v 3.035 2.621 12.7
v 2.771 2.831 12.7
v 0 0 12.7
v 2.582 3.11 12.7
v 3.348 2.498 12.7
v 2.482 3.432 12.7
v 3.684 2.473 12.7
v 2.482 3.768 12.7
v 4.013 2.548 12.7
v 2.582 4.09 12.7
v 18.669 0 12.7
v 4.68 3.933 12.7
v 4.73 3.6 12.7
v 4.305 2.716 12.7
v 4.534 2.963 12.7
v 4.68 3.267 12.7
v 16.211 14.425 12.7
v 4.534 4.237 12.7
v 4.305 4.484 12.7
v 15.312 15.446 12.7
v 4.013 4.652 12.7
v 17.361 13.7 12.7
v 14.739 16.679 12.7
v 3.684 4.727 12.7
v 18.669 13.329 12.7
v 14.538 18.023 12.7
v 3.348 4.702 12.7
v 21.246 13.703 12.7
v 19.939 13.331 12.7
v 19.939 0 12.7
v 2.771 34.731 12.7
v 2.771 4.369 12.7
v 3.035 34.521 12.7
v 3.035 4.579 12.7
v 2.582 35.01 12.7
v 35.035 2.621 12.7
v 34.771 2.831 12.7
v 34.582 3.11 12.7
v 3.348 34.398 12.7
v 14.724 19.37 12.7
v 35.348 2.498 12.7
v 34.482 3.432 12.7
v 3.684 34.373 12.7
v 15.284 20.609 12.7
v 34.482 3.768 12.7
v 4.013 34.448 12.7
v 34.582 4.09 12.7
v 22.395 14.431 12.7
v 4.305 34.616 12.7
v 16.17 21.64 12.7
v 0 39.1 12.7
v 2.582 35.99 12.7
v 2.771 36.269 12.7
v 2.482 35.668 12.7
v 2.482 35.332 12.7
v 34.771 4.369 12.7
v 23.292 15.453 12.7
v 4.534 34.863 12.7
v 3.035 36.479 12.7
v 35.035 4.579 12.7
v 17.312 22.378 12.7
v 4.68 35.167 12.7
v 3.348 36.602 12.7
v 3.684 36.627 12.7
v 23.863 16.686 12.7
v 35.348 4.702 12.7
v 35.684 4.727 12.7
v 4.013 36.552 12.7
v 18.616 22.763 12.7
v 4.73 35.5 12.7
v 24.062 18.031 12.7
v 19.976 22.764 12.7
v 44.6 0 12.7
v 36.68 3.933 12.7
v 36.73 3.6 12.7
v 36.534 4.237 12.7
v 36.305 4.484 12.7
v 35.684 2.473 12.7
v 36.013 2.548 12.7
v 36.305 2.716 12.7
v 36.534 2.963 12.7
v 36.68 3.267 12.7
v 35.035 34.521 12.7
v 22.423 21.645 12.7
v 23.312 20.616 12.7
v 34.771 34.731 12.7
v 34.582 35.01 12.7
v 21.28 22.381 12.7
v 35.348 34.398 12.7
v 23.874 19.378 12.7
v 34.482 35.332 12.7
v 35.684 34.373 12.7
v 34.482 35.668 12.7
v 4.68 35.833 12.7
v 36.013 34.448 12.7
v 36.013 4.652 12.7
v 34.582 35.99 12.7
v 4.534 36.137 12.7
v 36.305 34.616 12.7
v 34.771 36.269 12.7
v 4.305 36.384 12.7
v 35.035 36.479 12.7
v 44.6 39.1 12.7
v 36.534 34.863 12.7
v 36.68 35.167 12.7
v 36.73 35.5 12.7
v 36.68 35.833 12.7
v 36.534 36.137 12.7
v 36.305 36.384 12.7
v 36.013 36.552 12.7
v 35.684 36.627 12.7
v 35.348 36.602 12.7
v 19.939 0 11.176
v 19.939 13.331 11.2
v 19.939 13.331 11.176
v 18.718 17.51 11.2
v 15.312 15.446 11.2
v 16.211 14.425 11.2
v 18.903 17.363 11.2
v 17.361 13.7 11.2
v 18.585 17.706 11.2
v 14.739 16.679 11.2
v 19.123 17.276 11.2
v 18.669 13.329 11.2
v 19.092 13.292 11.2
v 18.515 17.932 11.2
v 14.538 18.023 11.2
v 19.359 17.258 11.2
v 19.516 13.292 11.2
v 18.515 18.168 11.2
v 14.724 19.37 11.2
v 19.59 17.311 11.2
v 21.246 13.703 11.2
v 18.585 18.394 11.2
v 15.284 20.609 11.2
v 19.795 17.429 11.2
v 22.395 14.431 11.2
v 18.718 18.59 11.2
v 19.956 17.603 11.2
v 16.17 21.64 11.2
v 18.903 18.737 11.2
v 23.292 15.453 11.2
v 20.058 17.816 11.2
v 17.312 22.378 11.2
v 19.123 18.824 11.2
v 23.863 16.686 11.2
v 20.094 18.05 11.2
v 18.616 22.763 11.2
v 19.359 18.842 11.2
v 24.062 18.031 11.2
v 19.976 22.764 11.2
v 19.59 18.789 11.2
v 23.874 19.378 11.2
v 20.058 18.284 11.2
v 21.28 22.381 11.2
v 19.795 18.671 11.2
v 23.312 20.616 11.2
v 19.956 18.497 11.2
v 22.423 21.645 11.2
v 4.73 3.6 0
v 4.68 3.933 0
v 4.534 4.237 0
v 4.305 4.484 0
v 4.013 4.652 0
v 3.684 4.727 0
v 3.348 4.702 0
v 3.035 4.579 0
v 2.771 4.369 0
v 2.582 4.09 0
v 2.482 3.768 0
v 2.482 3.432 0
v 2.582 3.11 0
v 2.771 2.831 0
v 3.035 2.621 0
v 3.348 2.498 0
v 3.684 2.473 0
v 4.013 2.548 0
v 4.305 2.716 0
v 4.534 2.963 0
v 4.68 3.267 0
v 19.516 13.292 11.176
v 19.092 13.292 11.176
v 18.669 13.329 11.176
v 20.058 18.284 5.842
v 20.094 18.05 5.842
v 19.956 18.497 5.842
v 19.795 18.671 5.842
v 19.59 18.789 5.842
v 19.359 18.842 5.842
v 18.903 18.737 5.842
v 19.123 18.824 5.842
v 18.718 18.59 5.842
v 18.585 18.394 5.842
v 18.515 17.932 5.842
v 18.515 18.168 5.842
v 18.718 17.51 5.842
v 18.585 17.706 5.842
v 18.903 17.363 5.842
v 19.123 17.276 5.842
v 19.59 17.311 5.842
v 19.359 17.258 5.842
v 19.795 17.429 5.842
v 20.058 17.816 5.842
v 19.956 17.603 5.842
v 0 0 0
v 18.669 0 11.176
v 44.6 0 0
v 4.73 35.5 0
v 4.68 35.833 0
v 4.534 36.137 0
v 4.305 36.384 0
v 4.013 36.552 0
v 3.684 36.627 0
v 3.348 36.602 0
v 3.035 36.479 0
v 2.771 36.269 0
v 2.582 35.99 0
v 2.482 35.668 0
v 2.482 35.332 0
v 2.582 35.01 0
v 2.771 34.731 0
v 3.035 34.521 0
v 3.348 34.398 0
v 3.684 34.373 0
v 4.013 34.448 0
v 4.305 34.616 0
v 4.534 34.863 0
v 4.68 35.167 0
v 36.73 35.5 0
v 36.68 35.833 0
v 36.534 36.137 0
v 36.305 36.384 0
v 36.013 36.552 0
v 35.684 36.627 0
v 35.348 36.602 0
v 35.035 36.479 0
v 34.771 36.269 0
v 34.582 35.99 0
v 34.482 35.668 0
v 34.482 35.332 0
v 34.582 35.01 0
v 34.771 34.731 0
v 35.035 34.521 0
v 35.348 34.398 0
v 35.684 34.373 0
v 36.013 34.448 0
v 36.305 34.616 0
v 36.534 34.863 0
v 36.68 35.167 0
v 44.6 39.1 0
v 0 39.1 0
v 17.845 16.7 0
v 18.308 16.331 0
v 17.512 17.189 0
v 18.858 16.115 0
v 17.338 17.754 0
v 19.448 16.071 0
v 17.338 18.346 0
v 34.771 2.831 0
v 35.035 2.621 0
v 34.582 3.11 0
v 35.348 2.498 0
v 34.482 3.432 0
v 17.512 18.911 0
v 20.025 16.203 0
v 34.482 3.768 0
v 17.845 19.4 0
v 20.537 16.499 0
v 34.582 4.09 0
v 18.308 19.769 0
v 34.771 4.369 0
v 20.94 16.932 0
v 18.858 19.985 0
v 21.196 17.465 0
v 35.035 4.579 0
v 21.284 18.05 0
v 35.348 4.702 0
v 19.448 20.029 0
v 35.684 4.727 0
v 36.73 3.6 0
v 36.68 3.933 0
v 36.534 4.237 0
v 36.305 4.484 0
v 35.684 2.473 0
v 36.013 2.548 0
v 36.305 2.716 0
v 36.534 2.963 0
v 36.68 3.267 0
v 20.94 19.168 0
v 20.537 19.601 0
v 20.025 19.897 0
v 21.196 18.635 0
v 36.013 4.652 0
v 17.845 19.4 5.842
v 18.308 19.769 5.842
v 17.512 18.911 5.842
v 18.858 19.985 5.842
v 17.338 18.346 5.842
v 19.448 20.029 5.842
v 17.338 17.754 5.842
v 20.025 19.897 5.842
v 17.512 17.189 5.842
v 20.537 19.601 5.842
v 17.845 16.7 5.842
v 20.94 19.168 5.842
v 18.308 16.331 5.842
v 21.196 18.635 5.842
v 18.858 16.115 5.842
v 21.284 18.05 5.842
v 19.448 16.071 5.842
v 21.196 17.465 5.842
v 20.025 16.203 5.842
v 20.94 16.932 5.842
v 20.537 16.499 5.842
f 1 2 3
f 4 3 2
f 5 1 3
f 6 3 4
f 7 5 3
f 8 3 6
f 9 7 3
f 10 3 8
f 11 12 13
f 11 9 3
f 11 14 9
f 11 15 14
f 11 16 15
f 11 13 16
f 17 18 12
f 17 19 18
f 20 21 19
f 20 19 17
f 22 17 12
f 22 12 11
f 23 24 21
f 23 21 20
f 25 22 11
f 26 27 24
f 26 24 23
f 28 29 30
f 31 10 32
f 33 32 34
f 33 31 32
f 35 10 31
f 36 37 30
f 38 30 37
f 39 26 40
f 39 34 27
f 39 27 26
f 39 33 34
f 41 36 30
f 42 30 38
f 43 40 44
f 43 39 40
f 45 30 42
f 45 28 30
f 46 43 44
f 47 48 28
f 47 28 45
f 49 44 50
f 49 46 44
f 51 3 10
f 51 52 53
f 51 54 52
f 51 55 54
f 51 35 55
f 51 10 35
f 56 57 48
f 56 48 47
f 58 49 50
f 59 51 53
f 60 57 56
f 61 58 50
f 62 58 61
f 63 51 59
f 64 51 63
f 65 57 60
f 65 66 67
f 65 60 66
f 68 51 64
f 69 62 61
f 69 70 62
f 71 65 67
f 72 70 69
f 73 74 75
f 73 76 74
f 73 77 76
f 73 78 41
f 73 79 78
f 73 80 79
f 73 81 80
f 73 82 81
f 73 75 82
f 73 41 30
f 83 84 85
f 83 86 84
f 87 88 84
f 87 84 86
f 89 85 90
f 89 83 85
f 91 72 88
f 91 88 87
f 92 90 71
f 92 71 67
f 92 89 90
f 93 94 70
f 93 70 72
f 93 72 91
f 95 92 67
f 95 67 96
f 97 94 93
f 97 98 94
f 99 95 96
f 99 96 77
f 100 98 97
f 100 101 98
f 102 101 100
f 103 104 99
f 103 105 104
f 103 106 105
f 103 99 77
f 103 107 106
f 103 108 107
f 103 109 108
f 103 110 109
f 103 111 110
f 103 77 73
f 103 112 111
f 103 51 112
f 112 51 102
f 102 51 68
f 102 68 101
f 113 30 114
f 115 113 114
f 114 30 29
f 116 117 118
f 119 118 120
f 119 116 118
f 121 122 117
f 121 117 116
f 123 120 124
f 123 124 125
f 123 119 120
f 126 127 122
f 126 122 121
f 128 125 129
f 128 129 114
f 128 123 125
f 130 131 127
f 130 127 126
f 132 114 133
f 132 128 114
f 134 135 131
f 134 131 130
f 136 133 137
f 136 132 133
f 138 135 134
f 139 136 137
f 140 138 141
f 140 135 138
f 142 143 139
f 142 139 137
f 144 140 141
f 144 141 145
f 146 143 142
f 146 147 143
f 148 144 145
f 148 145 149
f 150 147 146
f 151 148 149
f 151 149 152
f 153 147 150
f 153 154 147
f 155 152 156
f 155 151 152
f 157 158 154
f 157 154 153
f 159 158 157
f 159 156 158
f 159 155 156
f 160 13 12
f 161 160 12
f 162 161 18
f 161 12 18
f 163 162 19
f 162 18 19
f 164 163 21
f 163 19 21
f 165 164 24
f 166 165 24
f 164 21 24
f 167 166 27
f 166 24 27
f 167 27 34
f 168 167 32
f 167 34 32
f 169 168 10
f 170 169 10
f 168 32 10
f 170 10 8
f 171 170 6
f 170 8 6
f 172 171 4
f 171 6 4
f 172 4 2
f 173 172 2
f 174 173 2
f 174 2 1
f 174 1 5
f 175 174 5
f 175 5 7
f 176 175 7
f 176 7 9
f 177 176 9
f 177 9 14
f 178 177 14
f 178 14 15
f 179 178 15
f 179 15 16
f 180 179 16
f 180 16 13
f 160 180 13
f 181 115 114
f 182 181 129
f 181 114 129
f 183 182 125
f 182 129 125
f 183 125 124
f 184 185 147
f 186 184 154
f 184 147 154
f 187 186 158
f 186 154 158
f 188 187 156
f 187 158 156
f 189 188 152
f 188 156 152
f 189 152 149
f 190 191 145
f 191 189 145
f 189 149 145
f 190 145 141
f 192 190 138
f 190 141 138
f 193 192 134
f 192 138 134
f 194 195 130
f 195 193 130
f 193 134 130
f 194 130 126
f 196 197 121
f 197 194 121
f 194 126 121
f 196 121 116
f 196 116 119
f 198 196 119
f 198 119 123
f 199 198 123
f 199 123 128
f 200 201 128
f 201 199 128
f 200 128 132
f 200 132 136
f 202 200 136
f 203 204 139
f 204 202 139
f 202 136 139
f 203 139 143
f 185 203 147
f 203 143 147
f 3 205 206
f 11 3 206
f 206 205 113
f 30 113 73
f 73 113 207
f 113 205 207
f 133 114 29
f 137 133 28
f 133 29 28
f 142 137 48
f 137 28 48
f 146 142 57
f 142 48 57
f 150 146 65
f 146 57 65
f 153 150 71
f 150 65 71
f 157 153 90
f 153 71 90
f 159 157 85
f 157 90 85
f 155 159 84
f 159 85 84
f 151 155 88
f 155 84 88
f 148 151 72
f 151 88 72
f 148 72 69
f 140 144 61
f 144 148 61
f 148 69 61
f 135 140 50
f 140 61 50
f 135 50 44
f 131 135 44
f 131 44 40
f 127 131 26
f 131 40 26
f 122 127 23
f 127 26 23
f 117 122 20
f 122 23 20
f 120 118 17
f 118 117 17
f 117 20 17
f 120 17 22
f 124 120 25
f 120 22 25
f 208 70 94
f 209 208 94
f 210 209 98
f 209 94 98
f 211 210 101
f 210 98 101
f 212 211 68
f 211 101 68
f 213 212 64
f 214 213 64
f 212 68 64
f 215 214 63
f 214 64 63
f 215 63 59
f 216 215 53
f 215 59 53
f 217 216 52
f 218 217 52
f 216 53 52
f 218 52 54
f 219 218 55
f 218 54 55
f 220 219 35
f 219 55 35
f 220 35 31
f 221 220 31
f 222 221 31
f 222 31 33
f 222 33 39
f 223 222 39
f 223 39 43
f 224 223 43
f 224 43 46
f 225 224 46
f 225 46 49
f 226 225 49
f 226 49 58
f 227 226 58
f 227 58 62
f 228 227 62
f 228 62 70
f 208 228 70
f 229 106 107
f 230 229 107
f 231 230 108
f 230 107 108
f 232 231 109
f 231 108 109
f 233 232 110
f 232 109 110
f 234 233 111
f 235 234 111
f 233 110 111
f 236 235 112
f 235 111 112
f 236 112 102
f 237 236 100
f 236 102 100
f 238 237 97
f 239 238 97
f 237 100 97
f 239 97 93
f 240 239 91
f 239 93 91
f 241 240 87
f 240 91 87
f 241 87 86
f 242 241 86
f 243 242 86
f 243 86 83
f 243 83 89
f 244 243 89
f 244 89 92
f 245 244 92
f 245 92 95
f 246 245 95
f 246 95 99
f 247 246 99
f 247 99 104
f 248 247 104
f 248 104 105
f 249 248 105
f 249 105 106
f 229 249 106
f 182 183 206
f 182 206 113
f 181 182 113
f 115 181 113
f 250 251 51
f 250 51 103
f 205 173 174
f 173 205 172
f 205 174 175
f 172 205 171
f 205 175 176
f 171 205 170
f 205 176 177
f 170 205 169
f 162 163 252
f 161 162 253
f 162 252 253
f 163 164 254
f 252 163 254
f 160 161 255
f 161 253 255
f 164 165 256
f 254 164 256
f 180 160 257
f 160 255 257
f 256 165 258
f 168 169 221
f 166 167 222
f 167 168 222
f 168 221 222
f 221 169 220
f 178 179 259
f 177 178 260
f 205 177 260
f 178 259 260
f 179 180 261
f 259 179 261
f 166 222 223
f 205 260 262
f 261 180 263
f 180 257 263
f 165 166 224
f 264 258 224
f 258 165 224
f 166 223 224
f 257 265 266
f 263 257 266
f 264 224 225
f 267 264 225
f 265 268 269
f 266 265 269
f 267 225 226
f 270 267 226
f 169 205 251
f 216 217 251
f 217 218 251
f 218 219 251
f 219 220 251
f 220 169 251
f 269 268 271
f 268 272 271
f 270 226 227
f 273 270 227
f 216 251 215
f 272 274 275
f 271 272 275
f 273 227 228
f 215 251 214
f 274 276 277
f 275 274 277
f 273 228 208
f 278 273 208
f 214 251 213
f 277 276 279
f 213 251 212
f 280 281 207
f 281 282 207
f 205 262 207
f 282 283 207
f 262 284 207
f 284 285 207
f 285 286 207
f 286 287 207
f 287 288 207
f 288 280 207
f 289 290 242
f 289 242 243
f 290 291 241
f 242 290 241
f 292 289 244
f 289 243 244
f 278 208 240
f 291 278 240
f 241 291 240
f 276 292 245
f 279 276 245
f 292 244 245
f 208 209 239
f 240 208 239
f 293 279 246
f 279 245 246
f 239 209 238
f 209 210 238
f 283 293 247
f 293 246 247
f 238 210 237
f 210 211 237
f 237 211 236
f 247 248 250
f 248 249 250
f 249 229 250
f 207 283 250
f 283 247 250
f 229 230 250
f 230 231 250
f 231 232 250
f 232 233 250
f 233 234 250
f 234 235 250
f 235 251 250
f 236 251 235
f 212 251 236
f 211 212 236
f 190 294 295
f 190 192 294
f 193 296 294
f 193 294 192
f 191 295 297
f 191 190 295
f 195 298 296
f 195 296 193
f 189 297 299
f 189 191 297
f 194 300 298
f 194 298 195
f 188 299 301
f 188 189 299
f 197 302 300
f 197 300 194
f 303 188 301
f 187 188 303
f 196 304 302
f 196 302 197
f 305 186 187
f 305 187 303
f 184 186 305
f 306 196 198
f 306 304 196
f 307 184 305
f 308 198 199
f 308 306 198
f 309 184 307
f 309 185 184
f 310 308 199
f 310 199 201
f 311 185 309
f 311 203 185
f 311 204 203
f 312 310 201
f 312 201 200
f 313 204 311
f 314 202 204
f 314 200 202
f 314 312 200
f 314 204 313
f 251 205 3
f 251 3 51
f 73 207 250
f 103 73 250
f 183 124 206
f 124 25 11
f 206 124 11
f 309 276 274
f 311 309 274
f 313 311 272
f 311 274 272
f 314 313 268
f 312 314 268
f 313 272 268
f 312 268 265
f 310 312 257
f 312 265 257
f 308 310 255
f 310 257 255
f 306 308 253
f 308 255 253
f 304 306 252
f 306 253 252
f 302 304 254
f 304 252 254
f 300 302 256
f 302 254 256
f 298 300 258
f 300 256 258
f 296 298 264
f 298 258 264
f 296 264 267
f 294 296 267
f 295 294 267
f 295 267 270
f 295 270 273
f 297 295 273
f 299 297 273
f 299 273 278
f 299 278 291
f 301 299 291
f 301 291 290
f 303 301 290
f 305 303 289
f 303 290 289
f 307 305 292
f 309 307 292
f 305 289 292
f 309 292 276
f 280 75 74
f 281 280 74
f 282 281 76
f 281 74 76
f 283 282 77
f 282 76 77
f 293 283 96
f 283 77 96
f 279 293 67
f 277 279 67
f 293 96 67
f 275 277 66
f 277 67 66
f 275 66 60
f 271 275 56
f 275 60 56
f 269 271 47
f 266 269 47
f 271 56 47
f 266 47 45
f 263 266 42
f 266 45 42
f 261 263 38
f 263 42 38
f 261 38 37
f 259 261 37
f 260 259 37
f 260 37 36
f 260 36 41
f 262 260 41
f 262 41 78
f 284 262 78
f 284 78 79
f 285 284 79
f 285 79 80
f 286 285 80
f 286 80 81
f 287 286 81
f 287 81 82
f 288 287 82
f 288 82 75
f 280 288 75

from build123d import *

# Parameters (mm, degrees)
F0_W      = 44.6
F0_H      = 39.1
F1_DEPTH  = 12.7
F2_R      = 1.1303
F3_DEPTH  = 25
F4_R      = 4.7625
F5_DEPTH  = 1.5
F6_R      = 0.79375
F7_DEPTH  = 11.2
F8_R      = 1.984375
F8_R_2    = 0.79375
F9_DEPTH  = 5.842
F11_DEPTH = 1.524


with BuildPart() as f1:
    # F0 (on Top) → F1 (new body)
    with BuildSketch(Plane.XY):
        with Locations((22.3, 19.55)):
            Rectangle(F0_W, F0_H)
    extrude(amount=F1_DEPTH)

    # F2 (on face) → F3 (cut)
    with BuildSketch(Plane.XY.offset(12.7)):
        with Locations((3.6, 35.5)):
            Circle(F2_R)
        with Locations((3.6, 3.6)):
            Circle(F2_R)
        with Locations((35.6, 3.6)):
            Circle(F2_R)
        with Locations((35.6, 35.5)):
            Circle(F2_R)
    extrude(amount=-F3_DEPTH, mode=Mode.SUBTRACT)

    # F4 (on face) → F5 (cut)
    with BuildSketch(Plane.XY.offset(12.7)):
        with Locations((19.3, 18.05)):
            Circle(F4_R)
    extrude(amount=-F5_DEPTH, mode=Mode.SUBTRACT)

    # F6 (on face) → F7 (cut, through all)
    with BuildSketch(Plane.XY.offset(11.2)):
        with Locations((19.3, 18.05)):
            Circle(F6_R)
    extrude(amount=-F7_DEPTH, mode=Mode.SUBTRACT)

    # F8 (on face) → F9 (cut)
    with BuildSketch(Plane(origin=(0, 0, 0), x_dir=(1, 0, 0), z_dir=(0, 0, -1))):
        with Locations((19.3, -18.05)):
            Circle(F8_R)
        with Locations((19.3, -18.05)):
            Circle(F8_R_2, mode=Mode.SUBTRACT)
    extrude(amount=-F9_DEPTH, mode=Mode.SUBTRACT)

    # F10 (on face) → F11 (cut)
    with BuildSketch(Plane.XY.offset(12.7)):
        with BuildLine():
            ThreePointArc((19.939, 13.3305630368), (19.3040360368, 13.2875017102), (18.669, 13.3294867599))
            Line((18.669, 13.3294867599), (18.669, 0))
            Line((18.669, 0), (19.939, 0))
            Line((19.939, 0), (19.939, 13.3305630368))
        make_face()
    extrude(amount=-F11_DEPTH, mode=Mode.SUBTRACT)


solid = f1.part
